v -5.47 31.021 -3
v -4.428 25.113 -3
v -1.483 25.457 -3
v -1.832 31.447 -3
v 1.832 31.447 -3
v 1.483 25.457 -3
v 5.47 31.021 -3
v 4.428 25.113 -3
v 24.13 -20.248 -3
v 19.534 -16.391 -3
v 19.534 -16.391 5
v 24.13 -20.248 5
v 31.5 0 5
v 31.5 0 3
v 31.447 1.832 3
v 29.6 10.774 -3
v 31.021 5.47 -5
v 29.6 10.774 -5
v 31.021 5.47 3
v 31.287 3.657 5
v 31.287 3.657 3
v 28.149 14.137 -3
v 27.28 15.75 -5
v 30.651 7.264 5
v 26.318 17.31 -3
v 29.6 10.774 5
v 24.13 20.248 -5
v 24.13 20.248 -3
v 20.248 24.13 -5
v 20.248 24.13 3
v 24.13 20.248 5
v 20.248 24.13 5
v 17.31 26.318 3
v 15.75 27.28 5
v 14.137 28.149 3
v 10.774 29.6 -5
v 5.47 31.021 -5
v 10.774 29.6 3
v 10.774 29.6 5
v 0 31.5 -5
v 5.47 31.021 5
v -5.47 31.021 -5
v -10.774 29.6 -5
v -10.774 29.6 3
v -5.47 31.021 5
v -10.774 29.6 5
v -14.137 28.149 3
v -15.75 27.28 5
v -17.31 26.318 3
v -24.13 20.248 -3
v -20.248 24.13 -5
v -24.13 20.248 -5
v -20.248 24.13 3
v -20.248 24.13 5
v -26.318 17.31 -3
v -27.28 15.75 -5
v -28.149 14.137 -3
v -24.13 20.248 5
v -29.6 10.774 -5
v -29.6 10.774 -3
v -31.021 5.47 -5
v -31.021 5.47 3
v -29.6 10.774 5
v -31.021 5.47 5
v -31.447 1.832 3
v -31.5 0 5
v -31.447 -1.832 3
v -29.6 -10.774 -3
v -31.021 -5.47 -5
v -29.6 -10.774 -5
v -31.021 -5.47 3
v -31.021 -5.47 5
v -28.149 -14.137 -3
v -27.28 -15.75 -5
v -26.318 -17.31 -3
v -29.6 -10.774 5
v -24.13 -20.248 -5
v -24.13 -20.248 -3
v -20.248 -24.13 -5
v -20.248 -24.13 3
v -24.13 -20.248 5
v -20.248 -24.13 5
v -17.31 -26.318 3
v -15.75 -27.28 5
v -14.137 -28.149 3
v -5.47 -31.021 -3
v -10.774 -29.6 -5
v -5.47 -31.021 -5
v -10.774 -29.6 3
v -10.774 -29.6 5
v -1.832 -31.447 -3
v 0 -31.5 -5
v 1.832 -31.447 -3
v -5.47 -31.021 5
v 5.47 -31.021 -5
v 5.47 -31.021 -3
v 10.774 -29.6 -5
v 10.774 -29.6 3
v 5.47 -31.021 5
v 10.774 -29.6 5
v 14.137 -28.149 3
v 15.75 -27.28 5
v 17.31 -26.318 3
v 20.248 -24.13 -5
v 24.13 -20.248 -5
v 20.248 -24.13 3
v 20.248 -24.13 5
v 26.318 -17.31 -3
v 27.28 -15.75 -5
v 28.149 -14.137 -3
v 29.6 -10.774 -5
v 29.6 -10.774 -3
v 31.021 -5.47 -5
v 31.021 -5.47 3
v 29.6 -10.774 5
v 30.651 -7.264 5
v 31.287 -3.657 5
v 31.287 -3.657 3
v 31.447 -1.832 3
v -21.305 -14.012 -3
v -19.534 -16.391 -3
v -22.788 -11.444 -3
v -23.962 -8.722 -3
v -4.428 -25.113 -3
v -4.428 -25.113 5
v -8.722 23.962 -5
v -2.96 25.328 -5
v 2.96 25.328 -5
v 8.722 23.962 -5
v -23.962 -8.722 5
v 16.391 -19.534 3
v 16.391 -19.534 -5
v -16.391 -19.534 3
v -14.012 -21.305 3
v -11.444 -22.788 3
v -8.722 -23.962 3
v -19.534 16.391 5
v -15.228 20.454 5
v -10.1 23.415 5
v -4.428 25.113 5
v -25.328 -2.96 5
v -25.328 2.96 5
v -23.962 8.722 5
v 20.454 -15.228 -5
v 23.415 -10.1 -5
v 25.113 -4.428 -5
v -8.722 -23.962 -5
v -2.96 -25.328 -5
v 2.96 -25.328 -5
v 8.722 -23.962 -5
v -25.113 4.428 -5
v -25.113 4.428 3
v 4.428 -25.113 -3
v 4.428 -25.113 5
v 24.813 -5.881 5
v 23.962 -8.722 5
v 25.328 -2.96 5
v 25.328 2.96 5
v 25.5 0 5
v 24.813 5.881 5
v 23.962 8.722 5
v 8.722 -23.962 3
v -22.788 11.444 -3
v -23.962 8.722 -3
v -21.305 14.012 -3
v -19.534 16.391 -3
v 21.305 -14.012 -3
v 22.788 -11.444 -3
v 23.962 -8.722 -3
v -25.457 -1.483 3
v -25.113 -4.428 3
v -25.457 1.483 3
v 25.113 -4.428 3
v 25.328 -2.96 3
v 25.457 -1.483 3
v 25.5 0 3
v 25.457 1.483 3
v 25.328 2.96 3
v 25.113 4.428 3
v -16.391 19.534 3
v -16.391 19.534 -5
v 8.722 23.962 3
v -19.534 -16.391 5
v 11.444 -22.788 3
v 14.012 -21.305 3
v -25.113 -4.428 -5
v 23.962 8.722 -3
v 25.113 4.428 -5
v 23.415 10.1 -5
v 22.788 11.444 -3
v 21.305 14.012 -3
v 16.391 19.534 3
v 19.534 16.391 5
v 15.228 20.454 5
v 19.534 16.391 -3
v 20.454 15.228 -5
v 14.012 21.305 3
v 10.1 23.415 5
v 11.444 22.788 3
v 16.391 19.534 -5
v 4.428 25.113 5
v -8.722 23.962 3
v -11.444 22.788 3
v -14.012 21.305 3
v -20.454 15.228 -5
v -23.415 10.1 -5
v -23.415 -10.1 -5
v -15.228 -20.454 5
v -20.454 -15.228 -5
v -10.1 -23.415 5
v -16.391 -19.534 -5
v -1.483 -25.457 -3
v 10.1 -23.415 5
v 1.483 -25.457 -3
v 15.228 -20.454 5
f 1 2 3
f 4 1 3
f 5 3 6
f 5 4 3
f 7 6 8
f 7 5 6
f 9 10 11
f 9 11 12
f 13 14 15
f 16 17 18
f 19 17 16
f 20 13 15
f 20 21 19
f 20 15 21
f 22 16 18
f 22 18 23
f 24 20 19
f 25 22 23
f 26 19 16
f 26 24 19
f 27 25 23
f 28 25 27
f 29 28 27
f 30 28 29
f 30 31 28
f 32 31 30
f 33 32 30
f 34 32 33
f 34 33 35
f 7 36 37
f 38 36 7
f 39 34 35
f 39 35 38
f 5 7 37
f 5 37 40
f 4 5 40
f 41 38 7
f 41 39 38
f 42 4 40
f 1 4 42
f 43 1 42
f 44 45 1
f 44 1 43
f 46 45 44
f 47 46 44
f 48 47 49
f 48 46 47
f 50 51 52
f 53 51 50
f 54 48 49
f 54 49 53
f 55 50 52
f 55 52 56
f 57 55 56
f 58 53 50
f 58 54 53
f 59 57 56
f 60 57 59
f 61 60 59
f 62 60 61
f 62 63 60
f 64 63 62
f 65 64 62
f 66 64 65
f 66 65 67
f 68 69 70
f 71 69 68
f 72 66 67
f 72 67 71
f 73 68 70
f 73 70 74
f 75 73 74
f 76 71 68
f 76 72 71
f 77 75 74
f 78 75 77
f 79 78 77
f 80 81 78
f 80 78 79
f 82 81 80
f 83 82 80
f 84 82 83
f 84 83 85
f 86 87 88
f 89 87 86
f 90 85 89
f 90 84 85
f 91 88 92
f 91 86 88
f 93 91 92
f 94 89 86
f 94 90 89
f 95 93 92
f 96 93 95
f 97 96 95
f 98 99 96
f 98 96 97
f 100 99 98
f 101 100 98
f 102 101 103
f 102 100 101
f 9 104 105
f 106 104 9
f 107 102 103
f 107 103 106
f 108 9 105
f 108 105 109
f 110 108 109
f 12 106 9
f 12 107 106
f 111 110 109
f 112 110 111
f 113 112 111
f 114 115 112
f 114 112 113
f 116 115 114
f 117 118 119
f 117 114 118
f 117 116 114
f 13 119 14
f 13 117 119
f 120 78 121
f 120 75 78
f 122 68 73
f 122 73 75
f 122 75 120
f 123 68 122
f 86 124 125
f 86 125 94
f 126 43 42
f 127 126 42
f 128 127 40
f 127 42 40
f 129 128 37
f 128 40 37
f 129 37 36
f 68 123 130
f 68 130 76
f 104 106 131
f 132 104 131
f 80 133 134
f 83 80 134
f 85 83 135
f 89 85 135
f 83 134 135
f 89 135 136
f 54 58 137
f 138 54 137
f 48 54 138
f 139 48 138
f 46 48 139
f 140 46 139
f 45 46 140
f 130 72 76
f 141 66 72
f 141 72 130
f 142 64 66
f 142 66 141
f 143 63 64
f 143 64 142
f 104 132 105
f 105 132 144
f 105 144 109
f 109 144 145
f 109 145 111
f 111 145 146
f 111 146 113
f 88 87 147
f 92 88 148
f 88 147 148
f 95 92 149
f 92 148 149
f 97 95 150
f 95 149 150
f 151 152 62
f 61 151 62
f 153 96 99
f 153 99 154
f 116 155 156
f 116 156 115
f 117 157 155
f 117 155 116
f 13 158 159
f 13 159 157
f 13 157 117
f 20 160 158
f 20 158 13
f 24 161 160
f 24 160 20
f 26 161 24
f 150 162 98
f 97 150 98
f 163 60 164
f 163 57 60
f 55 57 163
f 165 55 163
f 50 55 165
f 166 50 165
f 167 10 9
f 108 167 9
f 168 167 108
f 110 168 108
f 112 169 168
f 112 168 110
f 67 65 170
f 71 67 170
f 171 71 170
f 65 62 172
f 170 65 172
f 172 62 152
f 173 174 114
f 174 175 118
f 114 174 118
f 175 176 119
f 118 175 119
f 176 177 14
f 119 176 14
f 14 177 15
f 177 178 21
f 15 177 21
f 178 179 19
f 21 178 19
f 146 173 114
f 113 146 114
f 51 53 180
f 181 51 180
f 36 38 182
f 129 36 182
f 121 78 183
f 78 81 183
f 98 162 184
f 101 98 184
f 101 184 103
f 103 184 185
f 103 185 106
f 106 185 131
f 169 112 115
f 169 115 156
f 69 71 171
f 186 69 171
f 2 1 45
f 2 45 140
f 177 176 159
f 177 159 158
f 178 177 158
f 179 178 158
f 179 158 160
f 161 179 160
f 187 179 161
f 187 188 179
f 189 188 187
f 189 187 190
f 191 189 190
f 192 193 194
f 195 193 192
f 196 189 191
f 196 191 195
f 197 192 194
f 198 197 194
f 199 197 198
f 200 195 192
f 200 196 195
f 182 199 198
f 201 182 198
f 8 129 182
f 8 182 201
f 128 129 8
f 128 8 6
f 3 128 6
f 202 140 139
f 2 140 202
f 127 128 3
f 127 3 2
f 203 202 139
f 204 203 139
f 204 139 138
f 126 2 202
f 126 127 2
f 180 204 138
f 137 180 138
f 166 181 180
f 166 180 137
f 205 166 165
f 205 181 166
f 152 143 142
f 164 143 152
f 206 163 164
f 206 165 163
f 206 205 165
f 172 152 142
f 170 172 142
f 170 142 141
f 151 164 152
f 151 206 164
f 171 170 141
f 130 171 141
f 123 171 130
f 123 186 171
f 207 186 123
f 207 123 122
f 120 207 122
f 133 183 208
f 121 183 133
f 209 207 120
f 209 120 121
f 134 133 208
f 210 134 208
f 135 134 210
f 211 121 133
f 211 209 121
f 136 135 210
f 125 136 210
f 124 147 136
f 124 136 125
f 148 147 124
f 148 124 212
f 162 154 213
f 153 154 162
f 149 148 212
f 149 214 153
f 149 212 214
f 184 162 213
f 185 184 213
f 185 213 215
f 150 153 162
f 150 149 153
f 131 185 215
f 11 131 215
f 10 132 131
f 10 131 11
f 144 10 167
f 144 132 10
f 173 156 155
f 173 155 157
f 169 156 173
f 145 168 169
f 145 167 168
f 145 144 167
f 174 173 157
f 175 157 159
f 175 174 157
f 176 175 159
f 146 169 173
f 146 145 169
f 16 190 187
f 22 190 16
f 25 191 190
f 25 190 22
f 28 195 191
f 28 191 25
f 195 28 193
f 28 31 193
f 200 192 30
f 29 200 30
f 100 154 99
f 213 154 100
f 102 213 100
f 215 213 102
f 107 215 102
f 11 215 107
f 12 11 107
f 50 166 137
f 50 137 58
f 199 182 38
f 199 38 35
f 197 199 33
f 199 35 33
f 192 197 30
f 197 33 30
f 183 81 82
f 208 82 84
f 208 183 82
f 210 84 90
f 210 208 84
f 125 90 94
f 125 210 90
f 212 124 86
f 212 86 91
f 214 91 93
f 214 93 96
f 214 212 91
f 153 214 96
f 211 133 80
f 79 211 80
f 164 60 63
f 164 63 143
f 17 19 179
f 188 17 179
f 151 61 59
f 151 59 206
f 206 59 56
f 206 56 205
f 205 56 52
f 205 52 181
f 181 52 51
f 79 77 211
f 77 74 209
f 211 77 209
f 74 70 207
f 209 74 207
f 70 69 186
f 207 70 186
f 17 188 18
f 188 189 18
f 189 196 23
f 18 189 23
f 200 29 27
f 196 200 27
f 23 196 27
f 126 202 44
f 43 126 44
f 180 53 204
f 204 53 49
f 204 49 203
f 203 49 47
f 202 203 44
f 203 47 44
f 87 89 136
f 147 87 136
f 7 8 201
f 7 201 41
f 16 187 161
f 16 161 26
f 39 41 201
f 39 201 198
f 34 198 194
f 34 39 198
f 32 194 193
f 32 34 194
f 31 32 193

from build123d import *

# Parameters (mm, degrees)
F0_R     = 31.5
F0_R_2   = 25.5
F1_DEPTH = 5
F5_DEPTH = 25
F7_DEPTH = 25
F8_DEPTH = 4.25
F9_DEPTH = 4.25


with BuildPart() as f1:
    # F0 (on Top) → F1 (new body, symmetric)
    with BuildSketch(Plane.XY):
        Circle(F0_R)
        Circle(F0_R_2, mode=Mode.SUBTRACT)
    extrude(amount=F1_DEPTH, both=True)

    # F4 (on offset) → F5 (cut)
    with BuildSketch(Plane.XY.offset(1.25)):
        with BuildLine():
            ThreePointArc((19.5341332995, 16.391084047), (22.0836477965, 12.75), (23.96216183, 8.7215136548))
            Line((23.96216183, 8.7215136548), (29.6003175548, 10.7736345148))
            ThreePointArc((29.6003175548, 10.7736345148), (27.2798002192, 15.75), (24.1303999582, 20.2478097051))
            Line((24.1303999582, 20.2478097051), (19.5341332995, 16.391084047))
        make_face()
        with BuildLine():
            Line((-5.4699175965, 31.0214442199), (-4.4280285305, 25.1125977018))
            ThreePointArc((-4.4280285305, 25.1125977018), (0, 25.5), (4.4280285305, 25.1125977018))
            Line((4.4280285305, 25.1125977018), (5.4699175965, 31.0214442199))
            ThreePointArc((5.4699175965, 31.0214442199), (0, 31.5), (-5.4699175965, 31.0214442199))
        make_face()
        with BuildLine():
            Line((-29.6003175548, 10.7736345148), (-23.96216183, 8.7215136548))
            ThreePointArc((-23.96216183, 8.7215136548), (-22.0836477965, 12.75), (-19.5341332995, 16.391084047))
            Line((-19.5341332995, 16.391084047), (-24.1303999582, 20.2478097051))
            ThreePointArc((-24.1303999582, 20.2478097051), (-27.2798002192, 15.75), (-29.6003175548, 10.7736345148))
        make_face()
        with BuildLine():
            Line((-24.1303999582, -20.2478097051), (-19.5341332995, -16.391084047))
            ThreePointArc((-19.5341332995, -16.391084047), (-22.0836477965, -12.75), (-23.96216183, -8.7215136548))
            Line((-23.96216183, -8.7215136548), (-29.6003175548, -10.7736345148))
            ThreePointArc((-29.6003175548, -10.7736345148), (-27.2798002192, -15.75), (-24.1303999582, -20.2478097051))
        make_face()
        with BuildLine():
            Line((5.4699175965, -31.0214442199), (4.4280285305, -25.1125977018))
            ThreePointArc((4.4280285305, -25.1125977018), (0, -25.5), (-4.4280285305, -25.1125977018))
            Line((-4.4280285305, -25.1125977018), (-5.4699175965, -31.0214442199))
            ThreePointArc((-5.4699175965, -31.0214442199), (0, -31.5), (5.4699175965, -31.0214442199))
        make_face()
        with BuildLine():
            Line((29.6003175548, -10.7736345148), (23.96216183, -8.7215136548))
            ThreePointArc((23.96216183, -8.7215136548), (22.0836477965, -12.75), (19.5341332995, -16.391084047))
            Line((19.5341332995, -16.391084047), (24.1303999582, -20.2478097051))
            ThreePointArc((24.1303999582, -20.2478097051), (27.2798002192, -15.75), (29.6003175548, -10.7736345148))
        make_face()
    extrude(amount=F5_DEPTH, mode=Mode.SUBTRACT)

    # F6 (on offset) → F7 (cut)
    with BuildSketch(Plane.XY.offset(-1.25)):
        with BuildLine():
            Line((10.7736345148, 29.6003175548), (8.7215136548, 23.96216183))
            ThreePointArc((8.7215136548, 23.96216183), (12.75, 22.0836477965), (16.391084047, 19.5341332995))
            Line((16.391084047, 19.5341332995), (20.2478097051, 24.1303999582))
            ThreePointArc((20.2478097051, 24.1303999582), (15.75, 27.2798002192), (10.7736345148, 29.6003175548))
        make_face()
        with BuildLine():
            Line((-8.7215136548, 23.96216183), (-10.7736345148, 29.6003175548))
            ThreePointArc((-10.7736345148, 29.6003175548), (-15.75, 27.2798002192), (-20.2478097051, 24.1303999582))
            Line((-20.2478097051, 24.1303999582), (-16.391084047, 19.5341332995))
            ThreePointArc((-16.391084047, 19.5341332995), (-12.75, 22.0836477965), (-8.7215136548, 23.96216183))
        make_face()
        with BuildLine():
            Line((-25.1125977018, 4.4280285305), (-31.0214442199, 5.4699175965))
            ThreePointArc((-31.0214442199, 5.4699175965), (-31.5, 0), (-31.0214442199, -5.4699175965))
            Line((-31.0214442199, -5.4699175965), (-25.1125977018, -4.4280285305))
            ThreePointArc((-25.1125977018, -4.4280285305), (-25.5, 0), (-25.1125977018, 4.4280285305))
        make_face()
        with BuildLine():
            Line((-16.391084047, -19.5341332995), (-20.2478097051, -24.1303999582))
            ThreePointArc((-20.2478097051, -24.1303999582), (-15.75, -27.2798002192), (-10.7736345148, -29.6003175548))
            Line((-10.7736345148, -29.6003175548), (-8.7215136548, -23.96216183))
            ThreePointArc((-8.7215136548, -23.96216183), (-12.75, -22.0836477965), (-16.391084047, -19.5341332995))
        make_face()
        with BuildLine():
            Line((8.7215136548, -23.96216183), (10.7736345148, -29.6003175548))
            ThreePointArc((10.7736345148, -29.6003175548), (15.75, -27.2798002192), (20.2478097051, -24.1303999582))
            Line((20.2478097051, -24.1303999582), (16.391084047, -19.5341332995))
            ThreePointArc((16.391084047, -19.5341332995), (12.75, -22.0836477965), (8.7215136548, -23.96216183))
        make_face()
        with BuildLine():
            Line((25.1125977018, -4.4280285305), (31.0214442199, -5.4699175965))
            ThreePointArc((31.0214442199, -5.4699175965), (31.5, 0), (31.0214442199, 5.4699175965))
            Line((31.0214442199, 5.4699175965), (25.1125977018, 4.4280285305))
            ThreePointArc((25.1125977018, 4.4280285305), (25.5, 0), (25.1125977018, -4.4280285305))
        make_face()
    extrude(amount=-F7_DEPTH, mode=Mode.SUBTRACT)

    # F8 (cut): faces of the model
    f8_faces = [f1.faces().sort_by_distance(p)[0] for p in [
        (-24.6473051281, -14.2301282505, 1.25),
        (-24.6473051281, 14.2301282505, 1.25),
        (0, 28.460256501, 1.25),
        (24.6473051281, 14.2301282505, 1.25),
        (24.6473051281, -14.2301282505, 1.25),
        (0, -28.460256501, 1.25),
    ]]
    extrude(f8_faces, amount=-F8_DEPTH, mode=Mode.SUBTRACT)

    # F9 (cut): faces of the model
    f9_faces = [f1.faces().sort_by_distance(p)[0] for p in [
        (-14.2301282505, -24.6473051281, -1.25),
        (14.2301282505, -24.6473051281, -1.25),
        (28.460256501, 0, -1.25),
        (14.2301282505, 24.6473051281, -1.25),
        (-14.2301282505, 24.6473051281, -1.25),
        (-28.460256501, 0, -1.25),
    ]]
    extrude(f9_faces, amount=-F9_DEPTH, mode=Mode.SUBTRACT)


solid = f1.part
